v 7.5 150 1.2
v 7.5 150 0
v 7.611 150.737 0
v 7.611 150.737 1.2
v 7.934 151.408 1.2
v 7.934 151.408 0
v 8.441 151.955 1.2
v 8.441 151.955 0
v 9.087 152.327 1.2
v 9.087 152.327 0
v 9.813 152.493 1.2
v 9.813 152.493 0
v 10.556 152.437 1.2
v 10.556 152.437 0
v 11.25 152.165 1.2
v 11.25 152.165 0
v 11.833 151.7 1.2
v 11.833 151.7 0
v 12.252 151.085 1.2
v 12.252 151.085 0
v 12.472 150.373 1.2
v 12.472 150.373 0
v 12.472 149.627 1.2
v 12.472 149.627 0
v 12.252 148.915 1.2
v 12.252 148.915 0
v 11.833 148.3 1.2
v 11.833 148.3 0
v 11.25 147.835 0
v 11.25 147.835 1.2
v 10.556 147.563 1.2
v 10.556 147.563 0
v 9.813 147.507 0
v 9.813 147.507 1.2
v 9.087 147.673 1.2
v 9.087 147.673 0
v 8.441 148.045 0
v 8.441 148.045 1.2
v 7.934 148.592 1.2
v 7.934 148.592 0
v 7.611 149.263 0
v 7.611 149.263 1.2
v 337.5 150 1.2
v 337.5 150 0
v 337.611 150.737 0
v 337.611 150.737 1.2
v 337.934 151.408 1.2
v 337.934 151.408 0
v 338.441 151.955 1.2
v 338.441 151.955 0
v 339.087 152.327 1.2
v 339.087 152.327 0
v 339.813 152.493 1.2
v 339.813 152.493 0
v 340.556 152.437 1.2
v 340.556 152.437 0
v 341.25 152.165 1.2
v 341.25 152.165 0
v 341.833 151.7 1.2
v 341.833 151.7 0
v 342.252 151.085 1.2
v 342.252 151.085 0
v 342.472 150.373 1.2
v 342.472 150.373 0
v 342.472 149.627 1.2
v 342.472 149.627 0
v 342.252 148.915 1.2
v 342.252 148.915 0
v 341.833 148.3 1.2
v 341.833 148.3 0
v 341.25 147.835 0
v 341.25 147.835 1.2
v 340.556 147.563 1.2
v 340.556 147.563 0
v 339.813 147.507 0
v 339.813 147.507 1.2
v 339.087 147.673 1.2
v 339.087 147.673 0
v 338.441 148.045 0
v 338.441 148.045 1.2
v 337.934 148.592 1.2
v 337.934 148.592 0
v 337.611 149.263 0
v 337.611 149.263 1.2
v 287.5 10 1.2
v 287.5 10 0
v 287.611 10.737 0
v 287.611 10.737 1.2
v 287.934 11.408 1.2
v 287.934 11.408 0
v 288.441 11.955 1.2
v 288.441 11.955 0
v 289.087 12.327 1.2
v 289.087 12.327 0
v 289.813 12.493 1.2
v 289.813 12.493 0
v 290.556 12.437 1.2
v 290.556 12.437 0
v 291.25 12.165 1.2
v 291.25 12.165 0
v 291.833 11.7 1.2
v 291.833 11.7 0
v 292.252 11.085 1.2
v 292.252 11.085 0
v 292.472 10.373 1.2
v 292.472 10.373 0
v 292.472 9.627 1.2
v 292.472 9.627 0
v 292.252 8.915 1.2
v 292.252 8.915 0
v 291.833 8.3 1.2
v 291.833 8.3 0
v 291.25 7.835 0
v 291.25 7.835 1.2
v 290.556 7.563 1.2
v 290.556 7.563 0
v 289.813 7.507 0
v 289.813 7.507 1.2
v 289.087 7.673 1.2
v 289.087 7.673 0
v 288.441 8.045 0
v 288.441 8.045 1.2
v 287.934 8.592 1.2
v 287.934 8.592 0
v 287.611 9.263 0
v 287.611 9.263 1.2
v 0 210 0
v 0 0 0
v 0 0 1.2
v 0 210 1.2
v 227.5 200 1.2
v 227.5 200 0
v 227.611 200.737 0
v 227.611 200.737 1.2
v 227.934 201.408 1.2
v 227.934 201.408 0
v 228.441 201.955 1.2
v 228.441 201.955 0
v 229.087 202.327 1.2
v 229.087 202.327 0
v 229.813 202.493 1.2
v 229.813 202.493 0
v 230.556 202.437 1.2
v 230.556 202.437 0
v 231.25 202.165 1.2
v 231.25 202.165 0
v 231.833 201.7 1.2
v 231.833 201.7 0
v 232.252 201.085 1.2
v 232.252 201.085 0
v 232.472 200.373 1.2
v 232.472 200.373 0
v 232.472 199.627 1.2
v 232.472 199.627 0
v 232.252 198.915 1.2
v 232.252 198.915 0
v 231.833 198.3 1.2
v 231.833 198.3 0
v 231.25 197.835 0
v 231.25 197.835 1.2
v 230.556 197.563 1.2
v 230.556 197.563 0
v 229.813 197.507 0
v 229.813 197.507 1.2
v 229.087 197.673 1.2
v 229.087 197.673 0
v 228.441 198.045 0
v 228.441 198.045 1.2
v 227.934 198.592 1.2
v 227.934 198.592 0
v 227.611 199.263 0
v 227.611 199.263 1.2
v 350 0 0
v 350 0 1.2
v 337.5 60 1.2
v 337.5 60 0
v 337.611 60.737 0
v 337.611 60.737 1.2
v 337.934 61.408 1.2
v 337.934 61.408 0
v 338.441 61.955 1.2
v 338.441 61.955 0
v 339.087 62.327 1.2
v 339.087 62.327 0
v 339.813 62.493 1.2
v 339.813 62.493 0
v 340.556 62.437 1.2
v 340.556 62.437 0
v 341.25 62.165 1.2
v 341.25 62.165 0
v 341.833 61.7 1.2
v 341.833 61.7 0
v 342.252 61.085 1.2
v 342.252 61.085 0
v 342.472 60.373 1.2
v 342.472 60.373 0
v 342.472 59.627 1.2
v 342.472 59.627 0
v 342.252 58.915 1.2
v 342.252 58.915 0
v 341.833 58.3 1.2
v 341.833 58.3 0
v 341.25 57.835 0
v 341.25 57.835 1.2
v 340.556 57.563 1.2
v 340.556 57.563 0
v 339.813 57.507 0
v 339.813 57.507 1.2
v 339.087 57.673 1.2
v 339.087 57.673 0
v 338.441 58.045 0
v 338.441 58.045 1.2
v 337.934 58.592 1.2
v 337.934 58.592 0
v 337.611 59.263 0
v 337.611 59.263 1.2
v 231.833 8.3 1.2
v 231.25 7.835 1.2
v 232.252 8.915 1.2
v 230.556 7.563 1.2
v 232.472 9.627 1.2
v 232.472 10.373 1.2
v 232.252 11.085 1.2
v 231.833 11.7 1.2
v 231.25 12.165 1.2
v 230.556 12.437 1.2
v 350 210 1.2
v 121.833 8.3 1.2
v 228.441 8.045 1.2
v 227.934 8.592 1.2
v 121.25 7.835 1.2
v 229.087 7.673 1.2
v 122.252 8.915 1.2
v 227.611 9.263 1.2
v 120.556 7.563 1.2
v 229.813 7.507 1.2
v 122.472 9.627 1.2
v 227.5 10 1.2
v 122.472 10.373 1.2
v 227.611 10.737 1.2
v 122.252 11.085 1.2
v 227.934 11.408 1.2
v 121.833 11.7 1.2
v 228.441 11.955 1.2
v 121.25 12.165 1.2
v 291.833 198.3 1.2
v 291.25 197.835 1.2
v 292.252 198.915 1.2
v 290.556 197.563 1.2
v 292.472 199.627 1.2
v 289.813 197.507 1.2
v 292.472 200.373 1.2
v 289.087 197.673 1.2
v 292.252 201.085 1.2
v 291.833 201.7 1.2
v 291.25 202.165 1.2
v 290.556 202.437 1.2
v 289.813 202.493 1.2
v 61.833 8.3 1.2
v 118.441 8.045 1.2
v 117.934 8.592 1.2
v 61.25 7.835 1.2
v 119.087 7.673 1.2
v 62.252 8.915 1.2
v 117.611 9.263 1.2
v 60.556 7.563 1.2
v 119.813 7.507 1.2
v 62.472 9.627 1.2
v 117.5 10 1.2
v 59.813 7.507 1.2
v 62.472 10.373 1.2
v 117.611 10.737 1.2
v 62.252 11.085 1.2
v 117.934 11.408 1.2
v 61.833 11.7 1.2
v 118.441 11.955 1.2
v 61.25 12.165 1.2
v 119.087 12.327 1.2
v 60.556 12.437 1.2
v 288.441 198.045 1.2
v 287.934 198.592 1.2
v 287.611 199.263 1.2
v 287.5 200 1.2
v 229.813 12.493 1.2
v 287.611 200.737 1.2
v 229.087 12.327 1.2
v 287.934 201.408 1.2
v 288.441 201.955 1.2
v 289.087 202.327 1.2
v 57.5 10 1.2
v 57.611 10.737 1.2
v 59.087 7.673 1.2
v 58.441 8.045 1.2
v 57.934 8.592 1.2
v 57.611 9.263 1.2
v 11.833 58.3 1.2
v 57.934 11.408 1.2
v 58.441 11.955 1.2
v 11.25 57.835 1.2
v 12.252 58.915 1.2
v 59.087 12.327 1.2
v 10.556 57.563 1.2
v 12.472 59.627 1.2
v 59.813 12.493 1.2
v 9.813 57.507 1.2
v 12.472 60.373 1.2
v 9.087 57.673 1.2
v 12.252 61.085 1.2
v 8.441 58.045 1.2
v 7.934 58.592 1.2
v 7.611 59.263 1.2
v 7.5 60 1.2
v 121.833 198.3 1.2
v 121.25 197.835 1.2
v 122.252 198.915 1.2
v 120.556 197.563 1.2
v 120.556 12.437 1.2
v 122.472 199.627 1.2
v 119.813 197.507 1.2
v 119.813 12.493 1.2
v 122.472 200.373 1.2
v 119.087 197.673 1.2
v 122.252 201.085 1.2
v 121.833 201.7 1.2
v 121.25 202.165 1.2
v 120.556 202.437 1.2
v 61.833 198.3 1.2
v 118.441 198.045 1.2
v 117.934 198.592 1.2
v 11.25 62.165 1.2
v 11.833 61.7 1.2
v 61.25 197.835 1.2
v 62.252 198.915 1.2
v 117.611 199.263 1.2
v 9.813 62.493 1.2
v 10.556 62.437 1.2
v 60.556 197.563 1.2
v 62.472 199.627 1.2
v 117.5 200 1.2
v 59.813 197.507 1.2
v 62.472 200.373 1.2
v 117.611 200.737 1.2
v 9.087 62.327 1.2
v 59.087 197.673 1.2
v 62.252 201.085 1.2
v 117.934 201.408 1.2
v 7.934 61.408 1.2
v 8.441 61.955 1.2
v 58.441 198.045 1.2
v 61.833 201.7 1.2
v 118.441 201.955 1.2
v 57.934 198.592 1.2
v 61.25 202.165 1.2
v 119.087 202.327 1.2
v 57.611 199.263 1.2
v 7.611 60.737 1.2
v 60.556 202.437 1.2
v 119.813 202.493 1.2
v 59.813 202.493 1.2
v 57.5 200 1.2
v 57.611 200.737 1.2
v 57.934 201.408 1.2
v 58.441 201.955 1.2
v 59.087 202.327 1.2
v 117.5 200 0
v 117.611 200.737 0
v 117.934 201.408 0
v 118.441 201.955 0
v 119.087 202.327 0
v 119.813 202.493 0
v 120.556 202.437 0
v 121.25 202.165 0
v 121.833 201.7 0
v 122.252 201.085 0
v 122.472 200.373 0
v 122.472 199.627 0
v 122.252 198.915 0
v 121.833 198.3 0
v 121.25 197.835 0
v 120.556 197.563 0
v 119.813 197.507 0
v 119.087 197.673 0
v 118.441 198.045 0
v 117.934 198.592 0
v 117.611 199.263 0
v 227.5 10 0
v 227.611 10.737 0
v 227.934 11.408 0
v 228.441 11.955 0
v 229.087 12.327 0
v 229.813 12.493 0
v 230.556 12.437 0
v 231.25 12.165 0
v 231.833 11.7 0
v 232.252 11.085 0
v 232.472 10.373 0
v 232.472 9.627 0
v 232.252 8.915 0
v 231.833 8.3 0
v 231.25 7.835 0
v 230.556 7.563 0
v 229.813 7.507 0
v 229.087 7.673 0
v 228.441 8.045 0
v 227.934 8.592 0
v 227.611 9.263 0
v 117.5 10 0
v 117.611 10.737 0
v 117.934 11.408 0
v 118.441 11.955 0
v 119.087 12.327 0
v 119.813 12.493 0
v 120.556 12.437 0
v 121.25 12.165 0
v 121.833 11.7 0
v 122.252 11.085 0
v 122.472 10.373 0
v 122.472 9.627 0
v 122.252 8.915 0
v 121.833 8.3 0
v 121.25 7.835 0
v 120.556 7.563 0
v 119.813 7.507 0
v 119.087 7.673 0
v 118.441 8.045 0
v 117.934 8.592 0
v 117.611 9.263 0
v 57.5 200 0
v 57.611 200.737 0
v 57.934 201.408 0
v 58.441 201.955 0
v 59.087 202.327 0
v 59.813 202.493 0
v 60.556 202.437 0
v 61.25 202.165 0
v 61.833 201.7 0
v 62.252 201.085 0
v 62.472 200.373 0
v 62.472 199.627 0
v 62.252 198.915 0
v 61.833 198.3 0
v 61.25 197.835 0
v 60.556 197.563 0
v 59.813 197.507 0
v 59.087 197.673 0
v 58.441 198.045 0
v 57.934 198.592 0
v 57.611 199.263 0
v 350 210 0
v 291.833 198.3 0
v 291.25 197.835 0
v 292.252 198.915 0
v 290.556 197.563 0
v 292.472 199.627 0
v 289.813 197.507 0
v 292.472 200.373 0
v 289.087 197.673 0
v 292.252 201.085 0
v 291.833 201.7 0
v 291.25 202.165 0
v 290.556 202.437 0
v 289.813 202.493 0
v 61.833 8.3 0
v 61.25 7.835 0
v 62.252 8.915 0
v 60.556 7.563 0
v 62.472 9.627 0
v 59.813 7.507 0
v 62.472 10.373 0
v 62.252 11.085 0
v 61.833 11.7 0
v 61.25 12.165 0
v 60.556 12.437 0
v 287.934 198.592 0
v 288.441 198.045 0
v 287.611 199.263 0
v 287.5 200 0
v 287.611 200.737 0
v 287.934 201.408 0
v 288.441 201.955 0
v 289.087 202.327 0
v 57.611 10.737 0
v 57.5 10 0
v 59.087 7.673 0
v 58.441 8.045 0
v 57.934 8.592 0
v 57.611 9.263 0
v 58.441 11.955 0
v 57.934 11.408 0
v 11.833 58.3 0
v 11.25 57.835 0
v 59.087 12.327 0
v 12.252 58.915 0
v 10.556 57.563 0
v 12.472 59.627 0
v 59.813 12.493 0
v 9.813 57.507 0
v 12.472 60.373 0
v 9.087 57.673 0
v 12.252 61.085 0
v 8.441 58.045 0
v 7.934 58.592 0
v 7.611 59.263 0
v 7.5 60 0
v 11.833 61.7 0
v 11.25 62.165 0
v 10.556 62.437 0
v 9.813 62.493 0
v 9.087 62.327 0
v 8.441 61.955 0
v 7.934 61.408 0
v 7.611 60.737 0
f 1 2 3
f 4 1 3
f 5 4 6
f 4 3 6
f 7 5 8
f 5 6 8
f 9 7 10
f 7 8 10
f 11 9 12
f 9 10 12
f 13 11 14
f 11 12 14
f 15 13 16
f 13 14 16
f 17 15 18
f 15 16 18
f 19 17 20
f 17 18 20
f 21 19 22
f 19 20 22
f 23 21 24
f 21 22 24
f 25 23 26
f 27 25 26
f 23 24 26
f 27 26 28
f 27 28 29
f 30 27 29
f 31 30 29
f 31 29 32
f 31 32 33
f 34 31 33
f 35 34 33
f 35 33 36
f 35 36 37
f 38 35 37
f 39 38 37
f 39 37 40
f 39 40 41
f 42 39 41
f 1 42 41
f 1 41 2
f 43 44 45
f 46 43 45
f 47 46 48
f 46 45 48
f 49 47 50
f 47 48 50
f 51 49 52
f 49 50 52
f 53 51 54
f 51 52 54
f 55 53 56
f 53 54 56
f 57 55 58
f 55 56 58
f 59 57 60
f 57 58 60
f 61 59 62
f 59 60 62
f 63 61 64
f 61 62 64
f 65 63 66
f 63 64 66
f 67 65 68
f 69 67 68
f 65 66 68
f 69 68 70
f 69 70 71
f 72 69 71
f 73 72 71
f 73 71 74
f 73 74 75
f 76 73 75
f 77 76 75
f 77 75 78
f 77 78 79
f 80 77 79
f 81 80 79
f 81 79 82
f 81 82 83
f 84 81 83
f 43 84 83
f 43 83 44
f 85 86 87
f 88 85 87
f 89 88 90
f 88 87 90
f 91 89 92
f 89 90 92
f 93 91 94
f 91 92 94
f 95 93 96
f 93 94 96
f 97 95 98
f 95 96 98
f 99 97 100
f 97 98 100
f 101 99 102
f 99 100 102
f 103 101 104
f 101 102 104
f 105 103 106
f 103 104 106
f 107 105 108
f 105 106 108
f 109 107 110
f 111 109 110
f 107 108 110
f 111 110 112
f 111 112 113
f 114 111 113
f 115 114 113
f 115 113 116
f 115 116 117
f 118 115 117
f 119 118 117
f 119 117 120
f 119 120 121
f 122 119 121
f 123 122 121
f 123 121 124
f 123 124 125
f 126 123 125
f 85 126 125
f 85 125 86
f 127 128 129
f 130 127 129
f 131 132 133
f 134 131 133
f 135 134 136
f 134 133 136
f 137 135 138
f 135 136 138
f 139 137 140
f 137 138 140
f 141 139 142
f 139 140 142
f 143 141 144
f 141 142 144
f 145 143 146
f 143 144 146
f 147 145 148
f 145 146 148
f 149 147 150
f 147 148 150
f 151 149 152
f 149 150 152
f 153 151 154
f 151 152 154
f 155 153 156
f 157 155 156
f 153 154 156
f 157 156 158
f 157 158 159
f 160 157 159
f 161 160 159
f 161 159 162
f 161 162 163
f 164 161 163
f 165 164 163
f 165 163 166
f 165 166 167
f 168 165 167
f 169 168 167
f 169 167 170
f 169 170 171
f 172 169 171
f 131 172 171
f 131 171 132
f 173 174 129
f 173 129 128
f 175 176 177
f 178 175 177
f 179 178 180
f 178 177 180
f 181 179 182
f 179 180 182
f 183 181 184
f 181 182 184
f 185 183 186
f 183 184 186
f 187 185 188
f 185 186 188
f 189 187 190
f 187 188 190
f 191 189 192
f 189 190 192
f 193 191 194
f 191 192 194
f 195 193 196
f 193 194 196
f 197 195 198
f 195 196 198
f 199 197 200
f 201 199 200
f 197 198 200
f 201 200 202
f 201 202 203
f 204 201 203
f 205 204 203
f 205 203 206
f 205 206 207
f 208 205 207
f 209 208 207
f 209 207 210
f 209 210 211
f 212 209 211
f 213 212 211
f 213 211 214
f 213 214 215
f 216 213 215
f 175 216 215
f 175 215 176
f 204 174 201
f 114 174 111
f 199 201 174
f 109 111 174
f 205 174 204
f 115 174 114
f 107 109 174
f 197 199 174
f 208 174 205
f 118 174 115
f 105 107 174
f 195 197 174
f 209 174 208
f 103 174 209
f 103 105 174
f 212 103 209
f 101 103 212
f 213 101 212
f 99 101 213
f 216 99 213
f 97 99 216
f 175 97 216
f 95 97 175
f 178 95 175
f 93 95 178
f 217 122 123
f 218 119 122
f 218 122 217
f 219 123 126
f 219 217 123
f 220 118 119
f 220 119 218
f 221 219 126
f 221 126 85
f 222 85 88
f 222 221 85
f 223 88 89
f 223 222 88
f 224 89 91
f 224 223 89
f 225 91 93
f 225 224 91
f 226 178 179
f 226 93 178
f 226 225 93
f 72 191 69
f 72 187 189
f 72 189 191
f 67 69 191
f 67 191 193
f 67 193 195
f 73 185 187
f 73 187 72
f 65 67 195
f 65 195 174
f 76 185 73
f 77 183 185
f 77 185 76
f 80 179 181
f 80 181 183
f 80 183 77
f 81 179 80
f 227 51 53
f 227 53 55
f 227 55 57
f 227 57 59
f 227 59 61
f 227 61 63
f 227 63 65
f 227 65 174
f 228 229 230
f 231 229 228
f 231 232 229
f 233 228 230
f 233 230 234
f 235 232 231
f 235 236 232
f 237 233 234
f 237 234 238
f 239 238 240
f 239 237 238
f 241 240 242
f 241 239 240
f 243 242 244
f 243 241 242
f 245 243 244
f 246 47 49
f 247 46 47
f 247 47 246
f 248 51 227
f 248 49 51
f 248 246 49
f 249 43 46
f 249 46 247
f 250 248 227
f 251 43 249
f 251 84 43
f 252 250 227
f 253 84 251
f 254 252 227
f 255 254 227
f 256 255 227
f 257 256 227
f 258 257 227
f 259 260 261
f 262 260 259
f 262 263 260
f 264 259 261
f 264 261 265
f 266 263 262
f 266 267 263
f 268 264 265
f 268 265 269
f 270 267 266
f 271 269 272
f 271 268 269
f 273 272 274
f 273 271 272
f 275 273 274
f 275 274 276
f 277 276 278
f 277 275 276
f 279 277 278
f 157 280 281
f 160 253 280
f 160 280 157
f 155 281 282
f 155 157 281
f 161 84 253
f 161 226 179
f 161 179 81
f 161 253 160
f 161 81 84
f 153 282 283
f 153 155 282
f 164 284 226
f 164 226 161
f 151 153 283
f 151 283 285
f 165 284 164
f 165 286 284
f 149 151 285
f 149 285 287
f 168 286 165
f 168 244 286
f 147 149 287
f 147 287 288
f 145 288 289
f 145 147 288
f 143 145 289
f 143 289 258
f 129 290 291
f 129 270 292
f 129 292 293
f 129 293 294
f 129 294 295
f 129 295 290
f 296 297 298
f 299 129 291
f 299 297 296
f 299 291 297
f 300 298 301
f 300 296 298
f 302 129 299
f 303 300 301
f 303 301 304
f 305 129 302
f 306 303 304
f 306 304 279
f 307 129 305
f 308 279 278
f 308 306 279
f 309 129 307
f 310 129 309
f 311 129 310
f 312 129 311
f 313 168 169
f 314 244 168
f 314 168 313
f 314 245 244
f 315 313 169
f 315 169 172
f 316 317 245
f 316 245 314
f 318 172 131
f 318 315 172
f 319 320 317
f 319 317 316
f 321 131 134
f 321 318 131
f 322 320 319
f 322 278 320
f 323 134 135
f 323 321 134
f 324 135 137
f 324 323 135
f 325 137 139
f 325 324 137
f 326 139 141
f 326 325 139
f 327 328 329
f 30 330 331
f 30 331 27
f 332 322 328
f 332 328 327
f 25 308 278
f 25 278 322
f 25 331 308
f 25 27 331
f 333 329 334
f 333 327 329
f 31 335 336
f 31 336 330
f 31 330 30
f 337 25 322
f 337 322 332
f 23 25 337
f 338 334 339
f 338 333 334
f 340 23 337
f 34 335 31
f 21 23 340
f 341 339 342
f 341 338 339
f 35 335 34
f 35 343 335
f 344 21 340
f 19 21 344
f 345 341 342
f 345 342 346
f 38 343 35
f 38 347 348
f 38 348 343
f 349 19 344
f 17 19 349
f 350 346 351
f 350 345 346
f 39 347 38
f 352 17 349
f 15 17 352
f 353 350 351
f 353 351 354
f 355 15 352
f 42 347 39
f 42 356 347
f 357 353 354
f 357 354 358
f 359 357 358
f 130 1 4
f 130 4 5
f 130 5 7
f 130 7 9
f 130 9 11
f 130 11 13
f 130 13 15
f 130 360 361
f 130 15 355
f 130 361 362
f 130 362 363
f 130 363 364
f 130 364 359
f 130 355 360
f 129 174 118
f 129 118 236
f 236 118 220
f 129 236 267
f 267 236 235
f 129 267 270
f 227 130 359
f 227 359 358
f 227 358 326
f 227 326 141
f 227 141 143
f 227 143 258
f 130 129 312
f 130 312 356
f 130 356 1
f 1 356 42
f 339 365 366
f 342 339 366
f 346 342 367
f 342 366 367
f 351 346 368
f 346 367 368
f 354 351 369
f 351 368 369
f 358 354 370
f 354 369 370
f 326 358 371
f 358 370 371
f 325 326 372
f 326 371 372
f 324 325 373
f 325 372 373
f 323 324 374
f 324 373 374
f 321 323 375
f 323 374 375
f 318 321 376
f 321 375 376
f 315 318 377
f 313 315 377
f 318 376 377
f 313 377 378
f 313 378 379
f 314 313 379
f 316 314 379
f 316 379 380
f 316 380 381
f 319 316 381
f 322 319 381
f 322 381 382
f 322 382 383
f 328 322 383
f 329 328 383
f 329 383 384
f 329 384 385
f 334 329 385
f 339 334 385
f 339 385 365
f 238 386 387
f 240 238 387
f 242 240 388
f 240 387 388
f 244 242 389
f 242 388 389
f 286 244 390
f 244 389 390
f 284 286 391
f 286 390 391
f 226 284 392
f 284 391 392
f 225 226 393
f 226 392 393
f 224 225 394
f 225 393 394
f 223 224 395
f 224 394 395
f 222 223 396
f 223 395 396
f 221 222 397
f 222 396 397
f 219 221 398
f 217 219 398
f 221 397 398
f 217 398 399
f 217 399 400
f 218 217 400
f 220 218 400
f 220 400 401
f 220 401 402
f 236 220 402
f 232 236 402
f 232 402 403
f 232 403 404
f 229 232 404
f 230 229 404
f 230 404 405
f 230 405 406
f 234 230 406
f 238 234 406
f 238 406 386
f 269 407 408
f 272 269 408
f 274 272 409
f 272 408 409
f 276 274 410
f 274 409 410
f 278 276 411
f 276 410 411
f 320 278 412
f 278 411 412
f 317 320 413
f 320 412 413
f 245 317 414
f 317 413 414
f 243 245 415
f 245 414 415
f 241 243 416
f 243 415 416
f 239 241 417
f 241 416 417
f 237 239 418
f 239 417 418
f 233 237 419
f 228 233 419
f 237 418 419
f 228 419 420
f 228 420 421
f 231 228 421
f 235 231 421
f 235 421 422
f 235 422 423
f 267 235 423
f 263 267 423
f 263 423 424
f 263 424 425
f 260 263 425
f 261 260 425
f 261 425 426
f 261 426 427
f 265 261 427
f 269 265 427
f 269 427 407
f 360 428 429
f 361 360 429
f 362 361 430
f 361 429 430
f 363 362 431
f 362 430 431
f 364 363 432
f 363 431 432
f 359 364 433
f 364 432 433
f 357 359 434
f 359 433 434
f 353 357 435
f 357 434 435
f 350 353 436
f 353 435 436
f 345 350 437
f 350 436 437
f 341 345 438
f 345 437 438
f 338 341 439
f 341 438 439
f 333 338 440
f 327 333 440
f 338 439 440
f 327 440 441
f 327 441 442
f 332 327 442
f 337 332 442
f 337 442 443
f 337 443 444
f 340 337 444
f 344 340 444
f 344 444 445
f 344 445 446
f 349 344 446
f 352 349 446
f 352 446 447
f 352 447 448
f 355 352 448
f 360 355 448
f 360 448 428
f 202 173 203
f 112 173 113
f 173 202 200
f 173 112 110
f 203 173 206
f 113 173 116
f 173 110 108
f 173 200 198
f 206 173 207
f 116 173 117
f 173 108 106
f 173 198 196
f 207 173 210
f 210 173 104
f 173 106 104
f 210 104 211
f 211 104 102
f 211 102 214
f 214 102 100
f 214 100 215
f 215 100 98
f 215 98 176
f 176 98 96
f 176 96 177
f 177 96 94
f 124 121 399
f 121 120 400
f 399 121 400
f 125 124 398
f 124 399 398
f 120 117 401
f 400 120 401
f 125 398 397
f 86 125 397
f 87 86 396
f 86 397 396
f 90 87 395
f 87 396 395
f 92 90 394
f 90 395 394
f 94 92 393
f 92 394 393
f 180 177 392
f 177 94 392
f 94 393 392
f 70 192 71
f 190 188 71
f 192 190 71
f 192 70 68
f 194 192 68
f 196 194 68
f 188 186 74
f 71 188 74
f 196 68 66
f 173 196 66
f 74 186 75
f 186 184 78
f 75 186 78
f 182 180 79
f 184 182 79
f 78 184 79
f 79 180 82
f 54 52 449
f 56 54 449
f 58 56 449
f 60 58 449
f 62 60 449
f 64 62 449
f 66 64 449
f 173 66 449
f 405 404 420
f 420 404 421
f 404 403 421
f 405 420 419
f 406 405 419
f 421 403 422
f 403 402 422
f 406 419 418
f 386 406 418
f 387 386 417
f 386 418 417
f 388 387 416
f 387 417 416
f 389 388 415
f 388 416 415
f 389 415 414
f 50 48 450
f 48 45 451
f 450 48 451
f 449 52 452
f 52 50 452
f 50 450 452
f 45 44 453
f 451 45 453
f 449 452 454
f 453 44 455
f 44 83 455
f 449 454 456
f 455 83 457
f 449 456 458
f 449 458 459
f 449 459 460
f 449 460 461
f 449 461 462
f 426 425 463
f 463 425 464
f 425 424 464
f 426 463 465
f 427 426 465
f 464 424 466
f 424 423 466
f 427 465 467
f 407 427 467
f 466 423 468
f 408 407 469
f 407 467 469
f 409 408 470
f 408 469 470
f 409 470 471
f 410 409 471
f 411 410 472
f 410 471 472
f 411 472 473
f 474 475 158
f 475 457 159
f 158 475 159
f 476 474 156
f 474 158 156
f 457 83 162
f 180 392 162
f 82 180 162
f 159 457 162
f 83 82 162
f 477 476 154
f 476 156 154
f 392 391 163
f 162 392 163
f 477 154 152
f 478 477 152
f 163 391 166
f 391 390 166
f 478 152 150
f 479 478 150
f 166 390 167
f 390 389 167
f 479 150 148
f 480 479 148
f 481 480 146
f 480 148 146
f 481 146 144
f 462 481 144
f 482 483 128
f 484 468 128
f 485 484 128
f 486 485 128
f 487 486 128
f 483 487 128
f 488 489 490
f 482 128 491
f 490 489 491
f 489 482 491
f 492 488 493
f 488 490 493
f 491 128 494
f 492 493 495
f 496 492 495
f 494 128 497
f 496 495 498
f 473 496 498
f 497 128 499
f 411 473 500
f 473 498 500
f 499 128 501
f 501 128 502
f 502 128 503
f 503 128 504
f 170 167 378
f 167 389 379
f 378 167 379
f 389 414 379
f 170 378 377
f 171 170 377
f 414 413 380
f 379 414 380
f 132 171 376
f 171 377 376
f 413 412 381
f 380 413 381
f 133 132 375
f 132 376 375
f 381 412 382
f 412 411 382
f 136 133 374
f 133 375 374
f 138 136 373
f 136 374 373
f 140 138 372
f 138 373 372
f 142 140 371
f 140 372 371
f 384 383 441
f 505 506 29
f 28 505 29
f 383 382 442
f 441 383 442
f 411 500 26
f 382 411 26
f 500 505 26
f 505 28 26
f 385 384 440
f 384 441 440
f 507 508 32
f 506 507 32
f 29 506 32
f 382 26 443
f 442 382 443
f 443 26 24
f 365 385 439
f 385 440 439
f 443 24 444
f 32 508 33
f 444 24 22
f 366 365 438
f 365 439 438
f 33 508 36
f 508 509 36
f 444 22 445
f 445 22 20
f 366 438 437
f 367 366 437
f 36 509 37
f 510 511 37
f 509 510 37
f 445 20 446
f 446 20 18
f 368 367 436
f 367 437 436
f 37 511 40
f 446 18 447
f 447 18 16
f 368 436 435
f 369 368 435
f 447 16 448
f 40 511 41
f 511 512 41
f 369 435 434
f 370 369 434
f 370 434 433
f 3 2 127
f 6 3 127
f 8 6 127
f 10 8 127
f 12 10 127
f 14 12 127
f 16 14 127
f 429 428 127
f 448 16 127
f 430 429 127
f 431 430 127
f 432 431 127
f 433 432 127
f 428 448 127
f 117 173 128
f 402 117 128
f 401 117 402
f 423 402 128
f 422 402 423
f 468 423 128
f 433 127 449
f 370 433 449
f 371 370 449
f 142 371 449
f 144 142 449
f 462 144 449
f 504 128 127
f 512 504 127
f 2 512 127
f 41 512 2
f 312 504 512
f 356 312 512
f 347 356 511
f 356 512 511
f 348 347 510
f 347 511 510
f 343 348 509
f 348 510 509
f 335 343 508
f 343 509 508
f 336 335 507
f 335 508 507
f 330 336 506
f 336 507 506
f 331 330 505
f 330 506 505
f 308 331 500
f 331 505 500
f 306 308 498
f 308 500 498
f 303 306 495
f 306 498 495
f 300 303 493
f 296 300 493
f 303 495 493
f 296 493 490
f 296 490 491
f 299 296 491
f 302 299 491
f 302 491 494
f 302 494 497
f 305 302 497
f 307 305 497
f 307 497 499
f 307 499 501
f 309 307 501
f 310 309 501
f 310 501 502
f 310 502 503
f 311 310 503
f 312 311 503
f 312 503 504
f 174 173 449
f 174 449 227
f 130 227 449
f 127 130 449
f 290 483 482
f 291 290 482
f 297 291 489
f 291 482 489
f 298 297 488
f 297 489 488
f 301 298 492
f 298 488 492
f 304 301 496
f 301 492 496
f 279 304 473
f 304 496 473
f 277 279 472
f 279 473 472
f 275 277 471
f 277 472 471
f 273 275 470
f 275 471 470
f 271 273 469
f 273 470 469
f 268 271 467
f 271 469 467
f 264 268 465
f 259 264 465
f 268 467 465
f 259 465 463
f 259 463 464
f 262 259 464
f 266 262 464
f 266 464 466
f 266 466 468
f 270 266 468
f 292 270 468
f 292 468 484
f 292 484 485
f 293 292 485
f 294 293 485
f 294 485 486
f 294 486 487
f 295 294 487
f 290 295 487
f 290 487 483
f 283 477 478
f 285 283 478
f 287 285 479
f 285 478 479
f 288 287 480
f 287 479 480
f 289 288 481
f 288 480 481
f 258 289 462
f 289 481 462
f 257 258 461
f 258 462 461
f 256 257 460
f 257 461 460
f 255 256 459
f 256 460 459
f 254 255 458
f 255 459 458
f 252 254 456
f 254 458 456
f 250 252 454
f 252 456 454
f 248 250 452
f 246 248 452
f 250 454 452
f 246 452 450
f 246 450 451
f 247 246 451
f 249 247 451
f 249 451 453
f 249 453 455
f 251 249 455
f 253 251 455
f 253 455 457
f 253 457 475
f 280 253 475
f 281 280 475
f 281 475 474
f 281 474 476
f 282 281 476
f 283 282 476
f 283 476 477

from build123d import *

# Parameters (mm, degrees)
SURFACE_EXTRUDE1_1_DEPTH = 350
THICKEN2_T1              = 1.2
SKETCH2_R                = 2.5
CUT_EXTRUDE1_DEPTH       = 10


with BuildPart() as body_1:
    # Surface-Extrude1: a surface, the sketch's curves swept straight by 350 mm
    with BuildLine(Plane(origin=(0, 0, 0), x_dir=(0, 0, -1), z_dir=(1, 0, 0)), mode=Mode.PRIVATE) as surface_extrude1_1_path:
        Line((0, 0), (0, 210))
    surface_extrude1_1 = Shell.extrude(surface_extrude1_1_path.wire(), (1 * SURFACE_EXTRUDE1_1_DEPTH, 0 * SURFACE_EXTRUDE1_1_DEPTH, 0 * SURFACE_EXTRUDE1_1_DEPTH))
    add(Solid.thicken(surface_extrude1_1, THICKEN2_T1))

    # Sketch2 → Cut-Extrude1 (cut)
    with BuildSketch(Plane(origin=(0, 0, 0), x_dir=(-1, 0, 0), z_dir=(0, 0, -1))):
        with Locations((-340, 150)):
            Circle(SKETCH2_R)
        with Locations((-290, 200)):
            Circle(SKETCH2_R)
        with Locations((-230, 200)):
            Circle(SKETCH2_R)
        with Locations((-10, 150)):
            Circle(SKETCH2_R)
        with Locations((-120, 200)):
            Circle(SKETCH2_R)
        with Locations((-60, 200)):
            Circle(SKETCH2_R)
        with Locations((-10, 60)):
            Circle(SKETCH2_R)
        with Locations((-60, 10)):
            Circle(SKETCH2_R)
        with Locations((-120, 10)):
            Circle(SKETCH2_R)
        with Locations((-230, 10)):
            Circle(SKETCH2_R)
        with Locations((-290, 10)):
            Circle(SKETCH2_R)
        with Locations((-340, 60)):
            Circle(SKETCH2_R)
    extrude(amount=-CUT_EXTRUDE1_DEPTH, mode=Mode.SUBTRACT)


solid = body_1.part
